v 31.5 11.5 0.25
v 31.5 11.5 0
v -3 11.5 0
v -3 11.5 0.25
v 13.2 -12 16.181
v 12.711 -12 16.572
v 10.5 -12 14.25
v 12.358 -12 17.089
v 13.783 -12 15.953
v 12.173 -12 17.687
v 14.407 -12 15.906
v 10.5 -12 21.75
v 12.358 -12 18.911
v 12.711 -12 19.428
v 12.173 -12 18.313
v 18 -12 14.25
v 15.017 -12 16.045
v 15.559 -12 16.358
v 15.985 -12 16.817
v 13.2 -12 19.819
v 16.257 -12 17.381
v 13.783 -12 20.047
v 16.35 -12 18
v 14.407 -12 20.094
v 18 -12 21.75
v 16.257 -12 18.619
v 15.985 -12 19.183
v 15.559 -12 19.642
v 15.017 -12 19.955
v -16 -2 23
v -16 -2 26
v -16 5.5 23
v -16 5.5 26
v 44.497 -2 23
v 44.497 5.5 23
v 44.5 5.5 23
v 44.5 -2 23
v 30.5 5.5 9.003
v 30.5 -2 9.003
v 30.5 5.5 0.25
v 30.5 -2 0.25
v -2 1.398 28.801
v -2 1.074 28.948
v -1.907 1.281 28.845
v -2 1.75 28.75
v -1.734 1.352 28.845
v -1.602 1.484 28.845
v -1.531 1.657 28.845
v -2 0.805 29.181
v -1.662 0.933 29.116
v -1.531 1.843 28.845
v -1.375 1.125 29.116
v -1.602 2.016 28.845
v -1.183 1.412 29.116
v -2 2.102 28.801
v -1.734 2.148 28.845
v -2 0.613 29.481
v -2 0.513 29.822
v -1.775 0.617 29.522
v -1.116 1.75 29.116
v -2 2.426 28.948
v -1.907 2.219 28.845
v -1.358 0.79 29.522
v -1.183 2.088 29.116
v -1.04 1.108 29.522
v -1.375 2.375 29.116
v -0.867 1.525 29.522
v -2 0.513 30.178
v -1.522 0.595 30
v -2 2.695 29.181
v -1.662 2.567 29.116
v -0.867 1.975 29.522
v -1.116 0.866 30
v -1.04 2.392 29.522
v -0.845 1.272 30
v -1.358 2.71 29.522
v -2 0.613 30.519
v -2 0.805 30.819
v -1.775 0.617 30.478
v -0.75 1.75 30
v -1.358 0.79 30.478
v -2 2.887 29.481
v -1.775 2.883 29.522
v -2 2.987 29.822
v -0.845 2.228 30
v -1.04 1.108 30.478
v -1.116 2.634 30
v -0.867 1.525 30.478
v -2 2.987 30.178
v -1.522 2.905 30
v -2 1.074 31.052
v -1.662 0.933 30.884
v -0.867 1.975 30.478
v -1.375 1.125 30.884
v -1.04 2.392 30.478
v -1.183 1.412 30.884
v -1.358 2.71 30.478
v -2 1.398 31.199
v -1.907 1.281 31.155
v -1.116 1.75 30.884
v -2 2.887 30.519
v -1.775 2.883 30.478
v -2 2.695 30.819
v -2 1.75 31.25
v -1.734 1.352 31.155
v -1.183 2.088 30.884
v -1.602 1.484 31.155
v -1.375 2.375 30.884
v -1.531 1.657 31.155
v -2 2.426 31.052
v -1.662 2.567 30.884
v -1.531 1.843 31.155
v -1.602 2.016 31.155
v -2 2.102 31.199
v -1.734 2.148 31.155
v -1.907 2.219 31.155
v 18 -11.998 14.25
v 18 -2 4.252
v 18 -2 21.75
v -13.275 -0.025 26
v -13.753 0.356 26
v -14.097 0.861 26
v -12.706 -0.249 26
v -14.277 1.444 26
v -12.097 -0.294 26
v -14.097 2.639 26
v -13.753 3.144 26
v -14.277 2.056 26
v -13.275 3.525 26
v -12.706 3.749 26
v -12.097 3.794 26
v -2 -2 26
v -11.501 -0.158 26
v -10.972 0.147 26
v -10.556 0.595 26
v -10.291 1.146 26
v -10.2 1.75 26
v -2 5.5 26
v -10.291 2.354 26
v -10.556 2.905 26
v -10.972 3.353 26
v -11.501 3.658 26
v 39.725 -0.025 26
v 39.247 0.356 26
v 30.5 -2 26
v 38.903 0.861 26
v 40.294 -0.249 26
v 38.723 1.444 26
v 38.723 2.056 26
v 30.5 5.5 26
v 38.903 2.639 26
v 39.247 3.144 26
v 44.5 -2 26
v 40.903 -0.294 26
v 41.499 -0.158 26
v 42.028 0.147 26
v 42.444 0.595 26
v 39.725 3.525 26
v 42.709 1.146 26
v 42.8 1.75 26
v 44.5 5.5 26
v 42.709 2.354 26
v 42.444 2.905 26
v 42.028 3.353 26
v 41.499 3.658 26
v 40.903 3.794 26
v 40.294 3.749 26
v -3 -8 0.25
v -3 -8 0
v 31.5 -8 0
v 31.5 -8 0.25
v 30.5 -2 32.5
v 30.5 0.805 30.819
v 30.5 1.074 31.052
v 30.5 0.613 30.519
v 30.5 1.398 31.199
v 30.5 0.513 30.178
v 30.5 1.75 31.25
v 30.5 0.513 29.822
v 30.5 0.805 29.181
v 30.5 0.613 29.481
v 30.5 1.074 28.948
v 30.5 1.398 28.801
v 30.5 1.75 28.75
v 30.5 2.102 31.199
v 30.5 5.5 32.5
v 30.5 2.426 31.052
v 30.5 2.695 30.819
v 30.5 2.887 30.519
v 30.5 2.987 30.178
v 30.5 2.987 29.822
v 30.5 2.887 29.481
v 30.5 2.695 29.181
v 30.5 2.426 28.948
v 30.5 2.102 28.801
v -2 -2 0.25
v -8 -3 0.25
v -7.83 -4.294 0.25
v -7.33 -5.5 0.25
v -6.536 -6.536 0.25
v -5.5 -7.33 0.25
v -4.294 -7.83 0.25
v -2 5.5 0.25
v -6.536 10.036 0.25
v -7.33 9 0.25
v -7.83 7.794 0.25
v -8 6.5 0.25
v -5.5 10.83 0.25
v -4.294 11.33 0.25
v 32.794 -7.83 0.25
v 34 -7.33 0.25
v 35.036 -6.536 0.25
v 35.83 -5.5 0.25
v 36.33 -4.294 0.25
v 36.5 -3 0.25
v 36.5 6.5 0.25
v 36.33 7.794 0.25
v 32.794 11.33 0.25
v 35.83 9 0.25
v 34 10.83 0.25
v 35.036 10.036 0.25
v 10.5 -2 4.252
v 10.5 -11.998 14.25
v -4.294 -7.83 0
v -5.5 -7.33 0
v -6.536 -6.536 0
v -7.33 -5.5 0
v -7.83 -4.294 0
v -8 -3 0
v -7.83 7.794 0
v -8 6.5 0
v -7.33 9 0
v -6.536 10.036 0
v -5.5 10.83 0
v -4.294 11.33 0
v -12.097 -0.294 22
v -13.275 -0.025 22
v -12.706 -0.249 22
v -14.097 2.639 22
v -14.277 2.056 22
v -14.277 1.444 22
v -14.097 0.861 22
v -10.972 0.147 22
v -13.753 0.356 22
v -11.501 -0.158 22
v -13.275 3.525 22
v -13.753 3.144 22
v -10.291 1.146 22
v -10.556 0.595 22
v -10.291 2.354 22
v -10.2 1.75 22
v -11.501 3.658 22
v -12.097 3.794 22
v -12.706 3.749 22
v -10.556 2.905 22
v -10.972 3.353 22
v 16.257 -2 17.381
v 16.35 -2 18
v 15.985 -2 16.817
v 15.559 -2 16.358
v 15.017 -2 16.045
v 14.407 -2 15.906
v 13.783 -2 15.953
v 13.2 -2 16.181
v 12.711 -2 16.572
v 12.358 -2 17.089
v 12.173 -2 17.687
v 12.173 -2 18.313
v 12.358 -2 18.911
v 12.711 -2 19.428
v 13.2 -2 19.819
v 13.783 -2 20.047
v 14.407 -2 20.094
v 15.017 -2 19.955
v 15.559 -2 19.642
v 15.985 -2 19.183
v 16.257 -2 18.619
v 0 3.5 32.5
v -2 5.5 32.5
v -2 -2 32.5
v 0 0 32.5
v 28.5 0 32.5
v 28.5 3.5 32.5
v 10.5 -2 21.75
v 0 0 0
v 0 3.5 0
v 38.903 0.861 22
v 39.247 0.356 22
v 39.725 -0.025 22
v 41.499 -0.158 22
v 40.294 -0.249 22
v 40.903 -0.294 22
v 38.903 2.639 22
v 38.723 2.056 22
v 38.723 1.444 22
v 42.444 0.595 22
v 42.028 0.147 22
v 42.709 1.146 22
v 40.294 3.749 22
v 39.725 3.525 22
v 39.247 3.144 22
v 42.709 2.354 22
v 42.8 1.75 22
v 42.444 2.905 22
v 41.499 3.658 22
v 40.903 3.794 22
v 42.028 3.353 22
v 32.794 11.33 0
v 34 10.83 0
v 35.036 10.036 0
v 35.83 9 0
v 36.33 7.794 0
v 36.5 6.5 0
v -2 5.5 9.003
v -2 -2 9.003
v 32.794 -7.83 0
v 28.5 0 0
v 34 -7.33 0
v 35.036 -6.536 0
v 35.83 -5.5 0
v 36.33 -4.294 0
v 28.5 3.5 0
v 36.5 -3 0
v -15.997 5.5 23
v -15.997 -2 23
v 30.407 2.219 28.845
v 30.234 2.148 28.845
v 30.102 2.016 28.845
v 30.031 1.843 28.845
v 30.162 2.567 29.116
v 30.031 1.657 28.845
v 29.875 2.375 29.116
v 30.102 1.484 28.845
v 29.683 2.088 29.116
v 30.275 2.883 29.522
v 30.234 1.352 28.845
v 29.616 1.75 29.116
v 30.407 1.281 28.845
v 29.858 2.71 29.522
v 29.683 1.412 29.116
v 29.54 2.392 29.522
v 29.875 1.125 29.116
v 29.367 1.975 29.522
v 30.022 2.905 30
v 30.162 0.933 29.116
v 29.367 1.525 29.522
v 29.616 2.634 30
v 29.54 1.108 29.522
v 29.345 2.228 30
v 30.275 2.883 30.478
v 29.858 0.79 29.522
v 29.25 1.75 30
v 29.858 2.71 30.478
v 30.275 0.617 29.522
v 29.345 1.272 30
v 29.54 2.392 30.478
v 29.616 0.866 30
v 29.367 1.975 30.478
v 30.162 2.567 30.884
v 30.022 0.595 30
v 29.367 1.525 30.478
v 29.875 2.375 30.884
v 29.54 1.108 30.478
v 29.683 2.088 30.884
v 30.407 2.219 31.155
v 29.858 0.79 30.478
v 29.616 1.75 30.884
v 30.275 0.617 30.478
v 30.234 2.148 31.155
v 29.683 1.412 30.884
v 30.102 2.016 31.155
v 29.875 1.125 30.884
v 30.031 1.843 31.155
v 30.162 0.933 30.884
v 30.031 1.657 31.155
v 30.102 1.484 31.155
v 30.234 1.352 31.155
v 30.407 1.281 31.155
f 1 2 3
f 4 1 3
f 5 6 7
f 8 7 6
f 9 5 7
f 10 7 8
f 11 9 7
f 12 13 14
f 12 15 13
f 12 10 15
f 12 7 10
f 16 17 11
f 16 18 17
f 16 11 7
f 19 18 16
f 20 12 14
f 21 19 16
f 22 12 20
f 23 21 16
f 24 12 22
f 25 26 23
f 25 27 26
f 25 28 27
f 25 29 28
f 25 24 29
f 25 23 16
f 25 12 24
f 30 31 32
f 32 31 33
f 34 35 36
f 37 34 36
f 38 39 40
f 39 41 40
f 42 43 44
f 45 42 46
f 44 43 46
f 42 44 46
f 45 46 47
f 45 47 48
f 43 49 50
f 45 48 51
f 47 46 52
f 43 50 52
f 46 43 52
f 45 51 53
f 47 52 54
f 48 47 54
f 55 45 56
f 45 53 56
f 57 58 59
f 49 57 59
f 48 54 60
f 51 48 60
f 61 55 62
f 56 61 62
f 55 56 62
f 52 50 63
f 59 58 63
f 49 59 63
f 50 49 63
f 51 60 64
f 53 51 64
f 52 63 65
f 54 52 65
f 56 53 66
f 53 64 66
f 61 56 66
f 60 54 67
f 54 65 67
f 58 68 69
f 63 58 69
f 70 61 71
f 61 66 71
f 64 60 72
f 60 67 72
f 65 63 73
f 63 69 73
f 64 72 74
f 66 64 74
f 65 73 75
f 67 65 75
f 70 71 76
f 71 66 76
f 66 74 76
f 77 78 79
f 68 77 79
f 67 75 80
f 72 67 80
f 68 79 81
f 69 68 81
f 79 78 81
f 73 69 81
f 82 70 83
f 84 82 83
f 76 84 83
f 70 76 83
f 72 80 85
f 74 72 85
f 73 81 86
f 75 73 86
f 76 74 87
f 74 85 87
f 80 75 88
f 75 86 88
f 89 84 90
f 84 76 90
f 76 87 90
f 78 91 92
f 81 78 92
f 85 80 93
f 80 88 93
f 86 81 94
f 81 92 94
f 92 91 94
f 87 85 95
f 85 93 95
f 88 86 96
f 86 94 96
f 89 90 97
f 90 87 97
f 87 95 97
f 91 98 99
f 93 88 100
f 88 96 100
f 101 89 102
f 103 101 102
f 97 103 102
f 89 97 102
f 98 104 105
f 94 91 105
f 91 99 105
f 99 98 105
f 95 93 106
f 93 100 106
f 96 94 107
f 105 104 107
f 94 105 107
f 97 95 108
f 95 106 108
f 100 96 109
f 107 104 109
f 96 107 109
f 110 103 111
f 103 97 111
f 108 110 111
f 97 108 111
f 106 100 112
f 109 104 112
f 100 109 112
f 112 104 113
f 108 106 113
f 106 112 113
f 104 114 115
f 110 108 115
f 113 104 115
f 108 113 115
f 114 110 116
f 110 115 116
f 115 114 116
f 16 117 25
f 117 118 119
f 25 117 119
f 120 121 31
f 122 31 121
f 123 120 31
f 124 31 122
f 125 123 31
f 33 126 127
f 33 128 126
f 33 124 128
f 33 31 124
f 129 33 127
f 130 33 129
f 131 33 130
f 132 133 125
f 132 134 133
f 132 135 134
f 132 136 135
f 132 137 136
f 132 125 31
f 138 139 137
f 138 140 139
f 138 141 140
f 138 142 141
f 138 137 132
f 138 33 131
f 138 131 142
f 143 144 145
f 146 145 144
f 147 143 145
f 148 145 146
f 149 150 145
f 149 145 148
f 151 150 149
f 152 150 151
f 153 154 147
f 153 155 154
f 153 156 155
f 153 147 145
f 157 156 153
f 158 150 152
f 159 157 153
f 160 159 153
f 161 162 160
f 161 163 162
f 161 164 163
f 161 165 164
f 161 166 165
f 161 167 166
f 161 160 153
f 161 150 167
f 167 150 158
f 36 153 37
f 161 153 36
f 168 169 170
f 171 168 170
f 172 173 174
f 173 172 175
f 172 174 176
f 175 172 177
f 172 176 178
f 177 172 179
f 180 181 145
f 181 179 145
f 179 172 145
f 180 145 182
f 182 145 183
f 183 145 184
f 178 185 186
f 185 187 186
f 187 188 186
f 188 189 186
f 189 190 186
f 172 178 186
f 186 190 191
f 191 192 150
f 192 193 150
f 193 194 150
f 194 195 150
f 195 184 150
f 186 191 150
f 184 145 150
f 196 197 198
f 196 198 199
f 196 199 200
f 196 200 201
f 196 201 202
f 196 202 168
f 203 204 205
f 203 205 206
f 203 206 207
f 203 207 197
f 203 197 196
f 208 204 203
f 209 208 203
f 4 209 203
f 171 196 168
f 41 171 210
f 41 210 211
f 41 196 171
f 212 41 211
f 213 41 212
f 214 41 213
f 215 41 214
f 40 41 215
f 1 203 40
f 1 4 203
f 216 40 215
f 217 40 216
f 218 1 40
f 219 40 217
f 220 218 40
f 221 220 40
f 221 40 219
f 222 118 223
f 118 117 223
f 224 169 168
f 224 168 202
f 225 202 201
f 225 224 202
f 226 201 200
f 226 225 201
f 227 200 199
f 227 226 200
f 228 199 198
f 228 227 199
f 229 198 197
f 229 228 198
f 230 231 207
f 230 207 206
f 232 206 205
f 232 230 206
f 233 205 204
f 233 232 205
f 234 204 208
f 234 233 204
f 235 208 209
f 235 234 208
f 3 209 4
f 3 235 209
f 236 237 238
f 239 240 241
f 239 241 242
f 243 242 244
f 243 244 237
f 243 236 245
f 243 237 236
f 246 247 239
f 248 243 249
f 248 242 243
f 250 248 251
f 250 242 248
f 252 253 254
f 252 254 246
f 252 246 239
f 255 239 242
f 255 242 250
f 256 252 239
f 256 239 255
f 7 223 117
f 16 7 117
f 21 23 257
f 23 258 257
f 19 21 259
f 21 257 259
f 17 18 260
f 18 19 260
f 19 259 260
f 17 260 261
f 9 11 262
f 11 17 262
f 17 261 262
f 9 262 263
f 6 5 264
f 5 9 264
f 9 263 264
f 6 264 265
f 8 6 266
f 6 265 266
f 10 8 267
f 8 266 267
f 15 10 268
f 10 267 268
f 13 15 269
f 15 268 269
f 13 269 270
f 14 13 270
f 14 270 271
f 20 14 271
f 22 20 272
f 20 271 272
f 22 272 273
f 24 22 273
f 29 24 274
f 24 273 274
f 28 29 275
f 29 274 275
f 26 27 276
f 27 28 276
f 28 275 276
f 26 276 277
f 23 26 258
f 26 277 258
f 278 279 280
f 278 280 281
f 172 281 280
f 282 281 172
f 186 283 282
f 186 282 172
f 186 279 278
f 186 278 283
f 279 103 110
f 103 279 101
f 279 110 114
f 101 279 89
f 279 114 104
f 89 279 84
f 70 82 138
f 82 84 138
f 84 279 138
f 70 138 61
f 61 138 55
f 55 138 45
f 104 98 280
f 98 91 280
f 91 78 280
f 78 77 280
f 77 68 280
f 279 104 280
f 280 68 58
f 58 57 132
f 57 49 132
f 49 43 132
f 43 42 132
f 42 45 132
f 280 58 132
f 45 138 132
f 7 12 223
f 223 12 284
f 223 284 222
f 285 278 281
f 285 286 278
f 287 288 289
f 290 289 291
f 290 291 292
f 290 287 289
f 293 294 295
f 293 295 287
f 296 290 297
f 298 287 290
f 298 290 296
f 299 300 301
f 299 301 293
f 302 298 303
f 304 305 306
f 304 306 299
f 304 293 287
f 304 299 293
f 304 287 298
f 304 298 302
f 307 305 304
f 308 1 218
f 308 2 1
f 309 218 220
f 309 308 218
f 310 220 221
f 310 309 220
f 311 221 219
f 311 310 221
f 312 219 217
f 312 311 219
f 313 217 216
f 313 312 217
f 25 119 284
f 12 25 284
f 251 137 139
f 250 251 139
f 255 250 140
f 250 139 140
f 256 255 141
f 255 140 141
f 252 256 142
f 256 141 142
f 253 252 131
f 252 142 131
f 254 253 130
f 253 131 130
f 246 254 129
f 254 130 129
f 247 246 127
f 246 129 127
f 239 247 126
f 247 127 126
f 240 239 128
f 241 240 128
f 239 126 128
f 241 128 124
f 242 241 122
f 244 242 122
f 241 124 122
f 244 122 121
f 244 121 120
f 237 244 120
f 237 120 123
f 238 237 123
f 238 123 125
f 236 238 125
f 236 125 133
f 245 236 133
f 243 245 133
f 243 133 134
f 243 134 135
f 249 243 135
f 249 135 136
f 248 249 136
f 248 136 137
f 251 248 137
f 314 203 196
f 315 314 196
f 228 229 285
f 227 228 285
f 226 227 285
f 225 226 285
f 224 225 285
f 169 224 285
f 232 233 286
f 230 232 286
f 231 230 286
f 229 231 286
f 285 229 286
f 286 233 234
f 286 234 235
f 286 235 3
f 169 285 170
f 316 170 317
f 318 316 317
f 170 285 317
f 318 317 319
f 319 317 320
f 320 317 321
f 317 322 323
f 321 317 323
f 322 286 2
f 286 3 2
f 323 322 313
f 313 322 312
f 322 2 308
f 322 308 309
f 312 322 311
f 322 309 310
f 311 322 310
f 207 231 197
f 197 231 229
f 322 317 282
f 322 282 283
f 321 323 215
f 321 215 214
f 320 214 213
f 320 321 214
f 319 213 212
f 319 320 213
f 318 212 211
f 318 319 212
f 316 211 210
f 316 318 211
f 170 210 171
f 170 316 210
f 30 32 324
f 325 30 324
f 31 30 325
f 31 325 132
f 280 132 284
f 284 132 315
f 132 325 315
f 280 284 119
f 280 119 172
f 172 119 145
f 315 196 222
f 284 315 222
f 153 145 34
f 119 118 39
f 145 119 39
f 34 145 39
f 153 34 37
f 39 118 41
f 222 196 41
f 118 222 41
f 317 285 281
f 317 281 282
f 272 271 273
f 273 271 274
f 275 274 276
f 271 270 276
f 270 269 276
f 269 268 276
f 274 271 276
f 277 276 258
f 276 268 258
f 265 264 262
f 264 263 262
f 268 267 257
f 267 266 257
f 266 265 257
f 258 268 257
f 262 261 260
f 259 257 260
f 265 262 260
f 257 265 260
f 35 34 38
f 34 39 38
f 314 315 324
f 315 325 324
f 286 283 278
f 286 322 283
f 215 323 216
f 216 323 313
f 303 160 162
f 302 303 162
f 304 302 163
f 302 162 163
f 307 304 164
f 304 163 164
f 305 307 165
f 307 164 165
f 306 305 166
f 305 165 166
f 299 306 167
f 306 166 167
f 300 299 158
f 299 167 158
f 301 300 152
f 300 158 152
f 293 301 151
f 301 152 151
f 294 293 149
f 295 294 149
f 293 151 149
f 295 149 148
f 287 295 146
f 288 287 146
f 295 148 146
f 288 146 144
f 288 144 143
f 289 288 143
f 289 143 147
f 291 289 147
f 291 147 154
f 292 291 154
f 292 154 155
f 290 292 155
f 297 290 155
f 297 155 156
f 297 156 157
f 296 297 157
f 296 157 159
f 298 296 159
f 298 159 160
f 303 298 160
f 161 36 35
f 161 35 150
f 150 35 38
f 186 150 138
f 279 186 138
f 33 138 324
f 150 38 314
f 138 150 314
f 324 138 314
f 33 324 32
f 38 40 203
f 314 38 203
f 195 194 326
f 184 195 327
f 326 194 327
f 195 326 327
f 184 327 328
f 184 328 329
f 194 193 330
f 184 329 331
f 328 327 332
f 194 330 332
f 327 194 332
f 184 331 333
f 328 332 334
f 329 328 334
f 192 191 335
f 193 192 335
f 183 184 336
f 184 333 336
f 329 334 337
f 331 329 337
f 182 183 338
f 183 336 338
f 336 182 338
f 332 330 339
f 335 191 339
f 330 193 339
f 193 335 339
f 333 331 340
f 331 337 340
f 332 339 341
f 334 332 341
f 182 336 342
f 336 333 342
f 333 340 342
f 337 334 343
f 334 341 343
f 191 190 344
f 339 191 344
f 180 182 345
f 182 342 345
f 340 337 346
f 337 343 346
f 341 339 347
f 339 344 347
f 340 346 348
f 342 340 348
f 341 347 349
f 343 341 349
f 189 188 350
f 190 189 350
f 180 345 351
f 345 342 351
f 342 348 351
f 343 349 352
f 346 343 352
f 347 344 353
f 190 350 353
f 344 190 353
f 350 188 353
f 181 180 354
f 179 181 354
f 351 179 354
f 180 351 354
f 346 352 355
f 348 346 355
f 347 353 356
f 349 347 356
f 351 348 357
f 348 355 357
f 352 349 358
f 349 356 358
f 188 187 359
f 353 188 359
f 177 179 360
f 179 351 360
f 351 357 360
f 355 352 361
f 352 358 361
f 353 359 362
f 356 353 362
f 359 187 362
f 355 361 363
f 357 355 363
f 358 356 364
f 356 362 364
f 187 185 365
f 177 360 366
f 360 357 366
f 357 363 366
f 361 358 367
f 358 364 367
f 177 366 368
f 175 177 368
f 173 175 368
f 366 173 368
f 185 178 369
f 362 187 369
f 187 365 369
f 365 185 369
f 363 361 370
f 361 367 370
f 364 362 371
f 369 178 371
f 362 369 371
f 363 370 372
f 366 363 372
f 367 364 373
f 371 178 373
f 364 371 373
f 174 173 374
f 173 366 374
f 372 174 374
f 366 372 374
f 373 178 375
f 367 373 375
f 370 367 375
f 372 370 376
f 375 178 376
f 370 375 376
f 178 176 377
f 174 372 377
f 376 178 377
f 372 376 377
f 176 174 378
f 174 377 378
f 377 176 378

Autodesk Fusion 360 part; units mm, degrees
sketch "Sketch1" plane through (0, 0, 0) normal (0, 0, 1) x (1, 0, 0)
  line L0 (0, 0) -> (28.5, 0)
  line L1 (28.5, 0) -> (28.5, 3.5)
  line L2 (28.5, 3.5) -> (0, 3.5)
  line L3 (0, 3.5) -> (0, 0)
  line L4 (-2, -2) -> (30.5, -2)
  line L5 (30.5, -2) -> (30.5, 5.5)
  line L6 (30.5, 5.5) -> (-2, 5.5)
  line L7 (-2, 5.5) -> (-2, -2)
  line L8 (-3, -8) -> (31.5, -8)
  line L9 (36.5, -3) -> (36.5, 6.5)
  line L10 (31.5, 11.5) -> (-3, 11.5)
  line L11 (-8, 6.5) -> (-8, -3)
  arc A0 (-3, 11.5) -> (-8, 6.5) centre (-3, 6.5) ccw
  arc A1 (36.5, 6.5) -> (31.5, 11.5) centre (31.5, 6.5) ccw
  arc A2 (31.5, -8) -> (36.5, -3) centre (31.5, -3) ccw
  arc A3 (-8, -3) -> (-3, -8) centre (-3, -3) ccw
  dimension "d1" = 28.5
  dimension "d2" = 3.5
  dimension "d3" = 2
  dimension "d48" = 5
extrude "Extrude1" add sketch "Sketch1" along normal blind 32.5 contours L4 L5 L6 L7
ref_plane "WorkPlane3" through (14.25, 1.75, 26) normal (0, 0, 1) x (1, 0, 0)
sketch "Sketch5" plane through (0, -2, 0) normal (0, -1, 0) x (1, 0, 0)
  line L0 (-2, 0) -> (30.5, 0)
  line L1 (30.5, 0) -> (30.5, 32.5)
  line L2 (30.5, 32.5) -> (-2, 32.5)
  line L3 (-2, 32.5) -> (-2, 0)
  line L4 (-5.25, 26) -> (33.75, 26)
  circle A0 centre (14.25, 18) radius 2.1
  line L5 (18, 21.75) -> (10.5, 21.75)
  line L6 (10.5, 21.75) -> (10.5, 14.25)
  line L7 (10.5, 14.25) -> (18, 14.25)
  line L8 (18, 14.25) -> (18, 21.75)
  line L9 (18, 21.75) -> (10.5, 14.25) construction
  line L10 (10.5, 21.75) -> (18, 14.25) construction
  line L11 (-2, 0) -> (30.5, 0)
  point P0 (14.25, 18)
  dimension "d27" = 4.2
  dimension "d28" = 7.5
  dimension "d29" = 7.5
  dimension "d30" = 8
extrude "Extrude3" add sketch "Sketch5" along normal blind 10 contours L5 L6 L7 L8
sketch "Sketch6" plane through (30.5, 0, 0) normal (1, 0, 0) x (0, 1, 0)
  line L0 (-2, 0) -> (5.5, 0)
  line L1 (5.5, 0) -> (5.5, 32.5)
  line L2 (5.5, 32.5) -> (-2, 32.5)
  line L3 (-2, 32.5) -> (-2, 0)
  line L4 (6.25, 26) -> (-2.75, 26)
  circle A0 centre (1.75, 30) radius 1.25
  line L5 (1.75, 31.25) -> (1.75, 28.75)
  dimension "d36" = 2.5
  dimension "d37" = 3.75
  dimension "d38" = 2.5
  dimension "d39" = 2.5
revolve "Revolve1" cut sketch "Sketch6" angle 360 about axis through (30.5, 1.75, 31.25) along (0, 0, -1) contours A0 L5 picked at (2.4551, 29.6422)
sketch "Sketch7" plane through (-2, 0, 0) normal (-1, 0, 0) x (0, -1, 0)
  line L0 (-5.5, 0) -> (2, 0)
  line L1 (2, 0) -> (2, 32.5)
  line L2 (2, 32.5) -> (-5.5, 32.5)
  line L3 (-5.5, 32.5) -> (-5.5, 0)
  line L4 (-6.25, 26) -> (2.75, 26)
  circle A0 centre (-1.75, 30) radius 1.25
  line L5 (-1.75, 31.25) -> (-1.75, 28.75)
  point P0 (-1.75, 31.25)
  dimension "d41" = 2.5
  dimension "d42" = 3.75
  dimension "d43" = 2.5
revolve "Revolve2" cut sketch "Sketch7" angle 360 about axis through (-2, 1.75, 31.25) along (0, 0, -1) contours A0 L5 picked at (-1.2448, 29.6517)
extrude "Extrude4" add sketch "Sketch1" along normal blind 0.25 contours L8 L9 L10 L11 A0 A1 A2 A3
sketch "Sketch8" plane through (14.25, 1.75, 26) normal (0, 0, 1) x (1, 0, 0)
  line L0 (16.25, -3.75) -> (16.25, 3.75)
  line L1 (16.25, -3.75) -> (30.25, -3.75)
  line L2 (30.25, -3.75) -> (30.25, 3.75)
  line L3 (30.25, 3.75) -> (16.25, 3.75)
  line L4 (16.25, 3.75) -> (16.25, -3.75)
  circle A0 centre (26.5, 0) radius 2.05
  circle A1 centre (26.5, 0) radius 3.55
  line L5 (-14.25, -1.75) -> (14.25, -1.75)
  line L6 (14.25, 1.75) -> (-14.25, 1.75)
  line L7 (0, -1.75) -> (0, 1.75)
  line L8 (-16.25, -3.75) -> (-16.25, 3.75)
  line L9 (-16.25, 3.75) -> (-16.25, -3.75)
  line L10 (-16.25, -3.75) -> (-30.25, -3.75)
  line L11 (-30.25, -3.75) -> (-30.25, 3.75)
  circle A2 centre (-26.5, 0) radius 2.05
  line L12 (-30.25, 3.75) -> (-16.25, 3.75)
  circle A3 centre (-26.5, 0) radius 3.55
  dimension "d51" = 7.5
  dimension "d52" = 14
  dimension "d53" = 4.1
  dimension "d54" = 3.75
  dimension "d55" = 3.75
  dimension "d56" = 7.1
extrude "Extrude6" add sketch "Sketch8" against normal blind 3 contours L0 L1 L2 L3 L4 | A0 | A1 | L8 L9 L10 L11 L12 | A2 | A3
chamfer "Chamfer3" distance 10 distance2 10 1 edges at (14.25, -2, 14.25) measured on face at (13, -2, 4.9167)
chamfer "Chamfer4" distance 14 angle 45 2 edges at (-2, 1.75, 23) (30.5, 1.75, 23)
extrude "Extrude7" cut sketch "Sketch8" against normal blind 4 contours A0 | A2
equation "d6 = 26 mm + 1.5 mm + 5 mm"
equation "d39 = d36"
equation "d54 = d51 / 2"
equation "d55 = d54"
equation "d56 = d53 + 3 mm"
